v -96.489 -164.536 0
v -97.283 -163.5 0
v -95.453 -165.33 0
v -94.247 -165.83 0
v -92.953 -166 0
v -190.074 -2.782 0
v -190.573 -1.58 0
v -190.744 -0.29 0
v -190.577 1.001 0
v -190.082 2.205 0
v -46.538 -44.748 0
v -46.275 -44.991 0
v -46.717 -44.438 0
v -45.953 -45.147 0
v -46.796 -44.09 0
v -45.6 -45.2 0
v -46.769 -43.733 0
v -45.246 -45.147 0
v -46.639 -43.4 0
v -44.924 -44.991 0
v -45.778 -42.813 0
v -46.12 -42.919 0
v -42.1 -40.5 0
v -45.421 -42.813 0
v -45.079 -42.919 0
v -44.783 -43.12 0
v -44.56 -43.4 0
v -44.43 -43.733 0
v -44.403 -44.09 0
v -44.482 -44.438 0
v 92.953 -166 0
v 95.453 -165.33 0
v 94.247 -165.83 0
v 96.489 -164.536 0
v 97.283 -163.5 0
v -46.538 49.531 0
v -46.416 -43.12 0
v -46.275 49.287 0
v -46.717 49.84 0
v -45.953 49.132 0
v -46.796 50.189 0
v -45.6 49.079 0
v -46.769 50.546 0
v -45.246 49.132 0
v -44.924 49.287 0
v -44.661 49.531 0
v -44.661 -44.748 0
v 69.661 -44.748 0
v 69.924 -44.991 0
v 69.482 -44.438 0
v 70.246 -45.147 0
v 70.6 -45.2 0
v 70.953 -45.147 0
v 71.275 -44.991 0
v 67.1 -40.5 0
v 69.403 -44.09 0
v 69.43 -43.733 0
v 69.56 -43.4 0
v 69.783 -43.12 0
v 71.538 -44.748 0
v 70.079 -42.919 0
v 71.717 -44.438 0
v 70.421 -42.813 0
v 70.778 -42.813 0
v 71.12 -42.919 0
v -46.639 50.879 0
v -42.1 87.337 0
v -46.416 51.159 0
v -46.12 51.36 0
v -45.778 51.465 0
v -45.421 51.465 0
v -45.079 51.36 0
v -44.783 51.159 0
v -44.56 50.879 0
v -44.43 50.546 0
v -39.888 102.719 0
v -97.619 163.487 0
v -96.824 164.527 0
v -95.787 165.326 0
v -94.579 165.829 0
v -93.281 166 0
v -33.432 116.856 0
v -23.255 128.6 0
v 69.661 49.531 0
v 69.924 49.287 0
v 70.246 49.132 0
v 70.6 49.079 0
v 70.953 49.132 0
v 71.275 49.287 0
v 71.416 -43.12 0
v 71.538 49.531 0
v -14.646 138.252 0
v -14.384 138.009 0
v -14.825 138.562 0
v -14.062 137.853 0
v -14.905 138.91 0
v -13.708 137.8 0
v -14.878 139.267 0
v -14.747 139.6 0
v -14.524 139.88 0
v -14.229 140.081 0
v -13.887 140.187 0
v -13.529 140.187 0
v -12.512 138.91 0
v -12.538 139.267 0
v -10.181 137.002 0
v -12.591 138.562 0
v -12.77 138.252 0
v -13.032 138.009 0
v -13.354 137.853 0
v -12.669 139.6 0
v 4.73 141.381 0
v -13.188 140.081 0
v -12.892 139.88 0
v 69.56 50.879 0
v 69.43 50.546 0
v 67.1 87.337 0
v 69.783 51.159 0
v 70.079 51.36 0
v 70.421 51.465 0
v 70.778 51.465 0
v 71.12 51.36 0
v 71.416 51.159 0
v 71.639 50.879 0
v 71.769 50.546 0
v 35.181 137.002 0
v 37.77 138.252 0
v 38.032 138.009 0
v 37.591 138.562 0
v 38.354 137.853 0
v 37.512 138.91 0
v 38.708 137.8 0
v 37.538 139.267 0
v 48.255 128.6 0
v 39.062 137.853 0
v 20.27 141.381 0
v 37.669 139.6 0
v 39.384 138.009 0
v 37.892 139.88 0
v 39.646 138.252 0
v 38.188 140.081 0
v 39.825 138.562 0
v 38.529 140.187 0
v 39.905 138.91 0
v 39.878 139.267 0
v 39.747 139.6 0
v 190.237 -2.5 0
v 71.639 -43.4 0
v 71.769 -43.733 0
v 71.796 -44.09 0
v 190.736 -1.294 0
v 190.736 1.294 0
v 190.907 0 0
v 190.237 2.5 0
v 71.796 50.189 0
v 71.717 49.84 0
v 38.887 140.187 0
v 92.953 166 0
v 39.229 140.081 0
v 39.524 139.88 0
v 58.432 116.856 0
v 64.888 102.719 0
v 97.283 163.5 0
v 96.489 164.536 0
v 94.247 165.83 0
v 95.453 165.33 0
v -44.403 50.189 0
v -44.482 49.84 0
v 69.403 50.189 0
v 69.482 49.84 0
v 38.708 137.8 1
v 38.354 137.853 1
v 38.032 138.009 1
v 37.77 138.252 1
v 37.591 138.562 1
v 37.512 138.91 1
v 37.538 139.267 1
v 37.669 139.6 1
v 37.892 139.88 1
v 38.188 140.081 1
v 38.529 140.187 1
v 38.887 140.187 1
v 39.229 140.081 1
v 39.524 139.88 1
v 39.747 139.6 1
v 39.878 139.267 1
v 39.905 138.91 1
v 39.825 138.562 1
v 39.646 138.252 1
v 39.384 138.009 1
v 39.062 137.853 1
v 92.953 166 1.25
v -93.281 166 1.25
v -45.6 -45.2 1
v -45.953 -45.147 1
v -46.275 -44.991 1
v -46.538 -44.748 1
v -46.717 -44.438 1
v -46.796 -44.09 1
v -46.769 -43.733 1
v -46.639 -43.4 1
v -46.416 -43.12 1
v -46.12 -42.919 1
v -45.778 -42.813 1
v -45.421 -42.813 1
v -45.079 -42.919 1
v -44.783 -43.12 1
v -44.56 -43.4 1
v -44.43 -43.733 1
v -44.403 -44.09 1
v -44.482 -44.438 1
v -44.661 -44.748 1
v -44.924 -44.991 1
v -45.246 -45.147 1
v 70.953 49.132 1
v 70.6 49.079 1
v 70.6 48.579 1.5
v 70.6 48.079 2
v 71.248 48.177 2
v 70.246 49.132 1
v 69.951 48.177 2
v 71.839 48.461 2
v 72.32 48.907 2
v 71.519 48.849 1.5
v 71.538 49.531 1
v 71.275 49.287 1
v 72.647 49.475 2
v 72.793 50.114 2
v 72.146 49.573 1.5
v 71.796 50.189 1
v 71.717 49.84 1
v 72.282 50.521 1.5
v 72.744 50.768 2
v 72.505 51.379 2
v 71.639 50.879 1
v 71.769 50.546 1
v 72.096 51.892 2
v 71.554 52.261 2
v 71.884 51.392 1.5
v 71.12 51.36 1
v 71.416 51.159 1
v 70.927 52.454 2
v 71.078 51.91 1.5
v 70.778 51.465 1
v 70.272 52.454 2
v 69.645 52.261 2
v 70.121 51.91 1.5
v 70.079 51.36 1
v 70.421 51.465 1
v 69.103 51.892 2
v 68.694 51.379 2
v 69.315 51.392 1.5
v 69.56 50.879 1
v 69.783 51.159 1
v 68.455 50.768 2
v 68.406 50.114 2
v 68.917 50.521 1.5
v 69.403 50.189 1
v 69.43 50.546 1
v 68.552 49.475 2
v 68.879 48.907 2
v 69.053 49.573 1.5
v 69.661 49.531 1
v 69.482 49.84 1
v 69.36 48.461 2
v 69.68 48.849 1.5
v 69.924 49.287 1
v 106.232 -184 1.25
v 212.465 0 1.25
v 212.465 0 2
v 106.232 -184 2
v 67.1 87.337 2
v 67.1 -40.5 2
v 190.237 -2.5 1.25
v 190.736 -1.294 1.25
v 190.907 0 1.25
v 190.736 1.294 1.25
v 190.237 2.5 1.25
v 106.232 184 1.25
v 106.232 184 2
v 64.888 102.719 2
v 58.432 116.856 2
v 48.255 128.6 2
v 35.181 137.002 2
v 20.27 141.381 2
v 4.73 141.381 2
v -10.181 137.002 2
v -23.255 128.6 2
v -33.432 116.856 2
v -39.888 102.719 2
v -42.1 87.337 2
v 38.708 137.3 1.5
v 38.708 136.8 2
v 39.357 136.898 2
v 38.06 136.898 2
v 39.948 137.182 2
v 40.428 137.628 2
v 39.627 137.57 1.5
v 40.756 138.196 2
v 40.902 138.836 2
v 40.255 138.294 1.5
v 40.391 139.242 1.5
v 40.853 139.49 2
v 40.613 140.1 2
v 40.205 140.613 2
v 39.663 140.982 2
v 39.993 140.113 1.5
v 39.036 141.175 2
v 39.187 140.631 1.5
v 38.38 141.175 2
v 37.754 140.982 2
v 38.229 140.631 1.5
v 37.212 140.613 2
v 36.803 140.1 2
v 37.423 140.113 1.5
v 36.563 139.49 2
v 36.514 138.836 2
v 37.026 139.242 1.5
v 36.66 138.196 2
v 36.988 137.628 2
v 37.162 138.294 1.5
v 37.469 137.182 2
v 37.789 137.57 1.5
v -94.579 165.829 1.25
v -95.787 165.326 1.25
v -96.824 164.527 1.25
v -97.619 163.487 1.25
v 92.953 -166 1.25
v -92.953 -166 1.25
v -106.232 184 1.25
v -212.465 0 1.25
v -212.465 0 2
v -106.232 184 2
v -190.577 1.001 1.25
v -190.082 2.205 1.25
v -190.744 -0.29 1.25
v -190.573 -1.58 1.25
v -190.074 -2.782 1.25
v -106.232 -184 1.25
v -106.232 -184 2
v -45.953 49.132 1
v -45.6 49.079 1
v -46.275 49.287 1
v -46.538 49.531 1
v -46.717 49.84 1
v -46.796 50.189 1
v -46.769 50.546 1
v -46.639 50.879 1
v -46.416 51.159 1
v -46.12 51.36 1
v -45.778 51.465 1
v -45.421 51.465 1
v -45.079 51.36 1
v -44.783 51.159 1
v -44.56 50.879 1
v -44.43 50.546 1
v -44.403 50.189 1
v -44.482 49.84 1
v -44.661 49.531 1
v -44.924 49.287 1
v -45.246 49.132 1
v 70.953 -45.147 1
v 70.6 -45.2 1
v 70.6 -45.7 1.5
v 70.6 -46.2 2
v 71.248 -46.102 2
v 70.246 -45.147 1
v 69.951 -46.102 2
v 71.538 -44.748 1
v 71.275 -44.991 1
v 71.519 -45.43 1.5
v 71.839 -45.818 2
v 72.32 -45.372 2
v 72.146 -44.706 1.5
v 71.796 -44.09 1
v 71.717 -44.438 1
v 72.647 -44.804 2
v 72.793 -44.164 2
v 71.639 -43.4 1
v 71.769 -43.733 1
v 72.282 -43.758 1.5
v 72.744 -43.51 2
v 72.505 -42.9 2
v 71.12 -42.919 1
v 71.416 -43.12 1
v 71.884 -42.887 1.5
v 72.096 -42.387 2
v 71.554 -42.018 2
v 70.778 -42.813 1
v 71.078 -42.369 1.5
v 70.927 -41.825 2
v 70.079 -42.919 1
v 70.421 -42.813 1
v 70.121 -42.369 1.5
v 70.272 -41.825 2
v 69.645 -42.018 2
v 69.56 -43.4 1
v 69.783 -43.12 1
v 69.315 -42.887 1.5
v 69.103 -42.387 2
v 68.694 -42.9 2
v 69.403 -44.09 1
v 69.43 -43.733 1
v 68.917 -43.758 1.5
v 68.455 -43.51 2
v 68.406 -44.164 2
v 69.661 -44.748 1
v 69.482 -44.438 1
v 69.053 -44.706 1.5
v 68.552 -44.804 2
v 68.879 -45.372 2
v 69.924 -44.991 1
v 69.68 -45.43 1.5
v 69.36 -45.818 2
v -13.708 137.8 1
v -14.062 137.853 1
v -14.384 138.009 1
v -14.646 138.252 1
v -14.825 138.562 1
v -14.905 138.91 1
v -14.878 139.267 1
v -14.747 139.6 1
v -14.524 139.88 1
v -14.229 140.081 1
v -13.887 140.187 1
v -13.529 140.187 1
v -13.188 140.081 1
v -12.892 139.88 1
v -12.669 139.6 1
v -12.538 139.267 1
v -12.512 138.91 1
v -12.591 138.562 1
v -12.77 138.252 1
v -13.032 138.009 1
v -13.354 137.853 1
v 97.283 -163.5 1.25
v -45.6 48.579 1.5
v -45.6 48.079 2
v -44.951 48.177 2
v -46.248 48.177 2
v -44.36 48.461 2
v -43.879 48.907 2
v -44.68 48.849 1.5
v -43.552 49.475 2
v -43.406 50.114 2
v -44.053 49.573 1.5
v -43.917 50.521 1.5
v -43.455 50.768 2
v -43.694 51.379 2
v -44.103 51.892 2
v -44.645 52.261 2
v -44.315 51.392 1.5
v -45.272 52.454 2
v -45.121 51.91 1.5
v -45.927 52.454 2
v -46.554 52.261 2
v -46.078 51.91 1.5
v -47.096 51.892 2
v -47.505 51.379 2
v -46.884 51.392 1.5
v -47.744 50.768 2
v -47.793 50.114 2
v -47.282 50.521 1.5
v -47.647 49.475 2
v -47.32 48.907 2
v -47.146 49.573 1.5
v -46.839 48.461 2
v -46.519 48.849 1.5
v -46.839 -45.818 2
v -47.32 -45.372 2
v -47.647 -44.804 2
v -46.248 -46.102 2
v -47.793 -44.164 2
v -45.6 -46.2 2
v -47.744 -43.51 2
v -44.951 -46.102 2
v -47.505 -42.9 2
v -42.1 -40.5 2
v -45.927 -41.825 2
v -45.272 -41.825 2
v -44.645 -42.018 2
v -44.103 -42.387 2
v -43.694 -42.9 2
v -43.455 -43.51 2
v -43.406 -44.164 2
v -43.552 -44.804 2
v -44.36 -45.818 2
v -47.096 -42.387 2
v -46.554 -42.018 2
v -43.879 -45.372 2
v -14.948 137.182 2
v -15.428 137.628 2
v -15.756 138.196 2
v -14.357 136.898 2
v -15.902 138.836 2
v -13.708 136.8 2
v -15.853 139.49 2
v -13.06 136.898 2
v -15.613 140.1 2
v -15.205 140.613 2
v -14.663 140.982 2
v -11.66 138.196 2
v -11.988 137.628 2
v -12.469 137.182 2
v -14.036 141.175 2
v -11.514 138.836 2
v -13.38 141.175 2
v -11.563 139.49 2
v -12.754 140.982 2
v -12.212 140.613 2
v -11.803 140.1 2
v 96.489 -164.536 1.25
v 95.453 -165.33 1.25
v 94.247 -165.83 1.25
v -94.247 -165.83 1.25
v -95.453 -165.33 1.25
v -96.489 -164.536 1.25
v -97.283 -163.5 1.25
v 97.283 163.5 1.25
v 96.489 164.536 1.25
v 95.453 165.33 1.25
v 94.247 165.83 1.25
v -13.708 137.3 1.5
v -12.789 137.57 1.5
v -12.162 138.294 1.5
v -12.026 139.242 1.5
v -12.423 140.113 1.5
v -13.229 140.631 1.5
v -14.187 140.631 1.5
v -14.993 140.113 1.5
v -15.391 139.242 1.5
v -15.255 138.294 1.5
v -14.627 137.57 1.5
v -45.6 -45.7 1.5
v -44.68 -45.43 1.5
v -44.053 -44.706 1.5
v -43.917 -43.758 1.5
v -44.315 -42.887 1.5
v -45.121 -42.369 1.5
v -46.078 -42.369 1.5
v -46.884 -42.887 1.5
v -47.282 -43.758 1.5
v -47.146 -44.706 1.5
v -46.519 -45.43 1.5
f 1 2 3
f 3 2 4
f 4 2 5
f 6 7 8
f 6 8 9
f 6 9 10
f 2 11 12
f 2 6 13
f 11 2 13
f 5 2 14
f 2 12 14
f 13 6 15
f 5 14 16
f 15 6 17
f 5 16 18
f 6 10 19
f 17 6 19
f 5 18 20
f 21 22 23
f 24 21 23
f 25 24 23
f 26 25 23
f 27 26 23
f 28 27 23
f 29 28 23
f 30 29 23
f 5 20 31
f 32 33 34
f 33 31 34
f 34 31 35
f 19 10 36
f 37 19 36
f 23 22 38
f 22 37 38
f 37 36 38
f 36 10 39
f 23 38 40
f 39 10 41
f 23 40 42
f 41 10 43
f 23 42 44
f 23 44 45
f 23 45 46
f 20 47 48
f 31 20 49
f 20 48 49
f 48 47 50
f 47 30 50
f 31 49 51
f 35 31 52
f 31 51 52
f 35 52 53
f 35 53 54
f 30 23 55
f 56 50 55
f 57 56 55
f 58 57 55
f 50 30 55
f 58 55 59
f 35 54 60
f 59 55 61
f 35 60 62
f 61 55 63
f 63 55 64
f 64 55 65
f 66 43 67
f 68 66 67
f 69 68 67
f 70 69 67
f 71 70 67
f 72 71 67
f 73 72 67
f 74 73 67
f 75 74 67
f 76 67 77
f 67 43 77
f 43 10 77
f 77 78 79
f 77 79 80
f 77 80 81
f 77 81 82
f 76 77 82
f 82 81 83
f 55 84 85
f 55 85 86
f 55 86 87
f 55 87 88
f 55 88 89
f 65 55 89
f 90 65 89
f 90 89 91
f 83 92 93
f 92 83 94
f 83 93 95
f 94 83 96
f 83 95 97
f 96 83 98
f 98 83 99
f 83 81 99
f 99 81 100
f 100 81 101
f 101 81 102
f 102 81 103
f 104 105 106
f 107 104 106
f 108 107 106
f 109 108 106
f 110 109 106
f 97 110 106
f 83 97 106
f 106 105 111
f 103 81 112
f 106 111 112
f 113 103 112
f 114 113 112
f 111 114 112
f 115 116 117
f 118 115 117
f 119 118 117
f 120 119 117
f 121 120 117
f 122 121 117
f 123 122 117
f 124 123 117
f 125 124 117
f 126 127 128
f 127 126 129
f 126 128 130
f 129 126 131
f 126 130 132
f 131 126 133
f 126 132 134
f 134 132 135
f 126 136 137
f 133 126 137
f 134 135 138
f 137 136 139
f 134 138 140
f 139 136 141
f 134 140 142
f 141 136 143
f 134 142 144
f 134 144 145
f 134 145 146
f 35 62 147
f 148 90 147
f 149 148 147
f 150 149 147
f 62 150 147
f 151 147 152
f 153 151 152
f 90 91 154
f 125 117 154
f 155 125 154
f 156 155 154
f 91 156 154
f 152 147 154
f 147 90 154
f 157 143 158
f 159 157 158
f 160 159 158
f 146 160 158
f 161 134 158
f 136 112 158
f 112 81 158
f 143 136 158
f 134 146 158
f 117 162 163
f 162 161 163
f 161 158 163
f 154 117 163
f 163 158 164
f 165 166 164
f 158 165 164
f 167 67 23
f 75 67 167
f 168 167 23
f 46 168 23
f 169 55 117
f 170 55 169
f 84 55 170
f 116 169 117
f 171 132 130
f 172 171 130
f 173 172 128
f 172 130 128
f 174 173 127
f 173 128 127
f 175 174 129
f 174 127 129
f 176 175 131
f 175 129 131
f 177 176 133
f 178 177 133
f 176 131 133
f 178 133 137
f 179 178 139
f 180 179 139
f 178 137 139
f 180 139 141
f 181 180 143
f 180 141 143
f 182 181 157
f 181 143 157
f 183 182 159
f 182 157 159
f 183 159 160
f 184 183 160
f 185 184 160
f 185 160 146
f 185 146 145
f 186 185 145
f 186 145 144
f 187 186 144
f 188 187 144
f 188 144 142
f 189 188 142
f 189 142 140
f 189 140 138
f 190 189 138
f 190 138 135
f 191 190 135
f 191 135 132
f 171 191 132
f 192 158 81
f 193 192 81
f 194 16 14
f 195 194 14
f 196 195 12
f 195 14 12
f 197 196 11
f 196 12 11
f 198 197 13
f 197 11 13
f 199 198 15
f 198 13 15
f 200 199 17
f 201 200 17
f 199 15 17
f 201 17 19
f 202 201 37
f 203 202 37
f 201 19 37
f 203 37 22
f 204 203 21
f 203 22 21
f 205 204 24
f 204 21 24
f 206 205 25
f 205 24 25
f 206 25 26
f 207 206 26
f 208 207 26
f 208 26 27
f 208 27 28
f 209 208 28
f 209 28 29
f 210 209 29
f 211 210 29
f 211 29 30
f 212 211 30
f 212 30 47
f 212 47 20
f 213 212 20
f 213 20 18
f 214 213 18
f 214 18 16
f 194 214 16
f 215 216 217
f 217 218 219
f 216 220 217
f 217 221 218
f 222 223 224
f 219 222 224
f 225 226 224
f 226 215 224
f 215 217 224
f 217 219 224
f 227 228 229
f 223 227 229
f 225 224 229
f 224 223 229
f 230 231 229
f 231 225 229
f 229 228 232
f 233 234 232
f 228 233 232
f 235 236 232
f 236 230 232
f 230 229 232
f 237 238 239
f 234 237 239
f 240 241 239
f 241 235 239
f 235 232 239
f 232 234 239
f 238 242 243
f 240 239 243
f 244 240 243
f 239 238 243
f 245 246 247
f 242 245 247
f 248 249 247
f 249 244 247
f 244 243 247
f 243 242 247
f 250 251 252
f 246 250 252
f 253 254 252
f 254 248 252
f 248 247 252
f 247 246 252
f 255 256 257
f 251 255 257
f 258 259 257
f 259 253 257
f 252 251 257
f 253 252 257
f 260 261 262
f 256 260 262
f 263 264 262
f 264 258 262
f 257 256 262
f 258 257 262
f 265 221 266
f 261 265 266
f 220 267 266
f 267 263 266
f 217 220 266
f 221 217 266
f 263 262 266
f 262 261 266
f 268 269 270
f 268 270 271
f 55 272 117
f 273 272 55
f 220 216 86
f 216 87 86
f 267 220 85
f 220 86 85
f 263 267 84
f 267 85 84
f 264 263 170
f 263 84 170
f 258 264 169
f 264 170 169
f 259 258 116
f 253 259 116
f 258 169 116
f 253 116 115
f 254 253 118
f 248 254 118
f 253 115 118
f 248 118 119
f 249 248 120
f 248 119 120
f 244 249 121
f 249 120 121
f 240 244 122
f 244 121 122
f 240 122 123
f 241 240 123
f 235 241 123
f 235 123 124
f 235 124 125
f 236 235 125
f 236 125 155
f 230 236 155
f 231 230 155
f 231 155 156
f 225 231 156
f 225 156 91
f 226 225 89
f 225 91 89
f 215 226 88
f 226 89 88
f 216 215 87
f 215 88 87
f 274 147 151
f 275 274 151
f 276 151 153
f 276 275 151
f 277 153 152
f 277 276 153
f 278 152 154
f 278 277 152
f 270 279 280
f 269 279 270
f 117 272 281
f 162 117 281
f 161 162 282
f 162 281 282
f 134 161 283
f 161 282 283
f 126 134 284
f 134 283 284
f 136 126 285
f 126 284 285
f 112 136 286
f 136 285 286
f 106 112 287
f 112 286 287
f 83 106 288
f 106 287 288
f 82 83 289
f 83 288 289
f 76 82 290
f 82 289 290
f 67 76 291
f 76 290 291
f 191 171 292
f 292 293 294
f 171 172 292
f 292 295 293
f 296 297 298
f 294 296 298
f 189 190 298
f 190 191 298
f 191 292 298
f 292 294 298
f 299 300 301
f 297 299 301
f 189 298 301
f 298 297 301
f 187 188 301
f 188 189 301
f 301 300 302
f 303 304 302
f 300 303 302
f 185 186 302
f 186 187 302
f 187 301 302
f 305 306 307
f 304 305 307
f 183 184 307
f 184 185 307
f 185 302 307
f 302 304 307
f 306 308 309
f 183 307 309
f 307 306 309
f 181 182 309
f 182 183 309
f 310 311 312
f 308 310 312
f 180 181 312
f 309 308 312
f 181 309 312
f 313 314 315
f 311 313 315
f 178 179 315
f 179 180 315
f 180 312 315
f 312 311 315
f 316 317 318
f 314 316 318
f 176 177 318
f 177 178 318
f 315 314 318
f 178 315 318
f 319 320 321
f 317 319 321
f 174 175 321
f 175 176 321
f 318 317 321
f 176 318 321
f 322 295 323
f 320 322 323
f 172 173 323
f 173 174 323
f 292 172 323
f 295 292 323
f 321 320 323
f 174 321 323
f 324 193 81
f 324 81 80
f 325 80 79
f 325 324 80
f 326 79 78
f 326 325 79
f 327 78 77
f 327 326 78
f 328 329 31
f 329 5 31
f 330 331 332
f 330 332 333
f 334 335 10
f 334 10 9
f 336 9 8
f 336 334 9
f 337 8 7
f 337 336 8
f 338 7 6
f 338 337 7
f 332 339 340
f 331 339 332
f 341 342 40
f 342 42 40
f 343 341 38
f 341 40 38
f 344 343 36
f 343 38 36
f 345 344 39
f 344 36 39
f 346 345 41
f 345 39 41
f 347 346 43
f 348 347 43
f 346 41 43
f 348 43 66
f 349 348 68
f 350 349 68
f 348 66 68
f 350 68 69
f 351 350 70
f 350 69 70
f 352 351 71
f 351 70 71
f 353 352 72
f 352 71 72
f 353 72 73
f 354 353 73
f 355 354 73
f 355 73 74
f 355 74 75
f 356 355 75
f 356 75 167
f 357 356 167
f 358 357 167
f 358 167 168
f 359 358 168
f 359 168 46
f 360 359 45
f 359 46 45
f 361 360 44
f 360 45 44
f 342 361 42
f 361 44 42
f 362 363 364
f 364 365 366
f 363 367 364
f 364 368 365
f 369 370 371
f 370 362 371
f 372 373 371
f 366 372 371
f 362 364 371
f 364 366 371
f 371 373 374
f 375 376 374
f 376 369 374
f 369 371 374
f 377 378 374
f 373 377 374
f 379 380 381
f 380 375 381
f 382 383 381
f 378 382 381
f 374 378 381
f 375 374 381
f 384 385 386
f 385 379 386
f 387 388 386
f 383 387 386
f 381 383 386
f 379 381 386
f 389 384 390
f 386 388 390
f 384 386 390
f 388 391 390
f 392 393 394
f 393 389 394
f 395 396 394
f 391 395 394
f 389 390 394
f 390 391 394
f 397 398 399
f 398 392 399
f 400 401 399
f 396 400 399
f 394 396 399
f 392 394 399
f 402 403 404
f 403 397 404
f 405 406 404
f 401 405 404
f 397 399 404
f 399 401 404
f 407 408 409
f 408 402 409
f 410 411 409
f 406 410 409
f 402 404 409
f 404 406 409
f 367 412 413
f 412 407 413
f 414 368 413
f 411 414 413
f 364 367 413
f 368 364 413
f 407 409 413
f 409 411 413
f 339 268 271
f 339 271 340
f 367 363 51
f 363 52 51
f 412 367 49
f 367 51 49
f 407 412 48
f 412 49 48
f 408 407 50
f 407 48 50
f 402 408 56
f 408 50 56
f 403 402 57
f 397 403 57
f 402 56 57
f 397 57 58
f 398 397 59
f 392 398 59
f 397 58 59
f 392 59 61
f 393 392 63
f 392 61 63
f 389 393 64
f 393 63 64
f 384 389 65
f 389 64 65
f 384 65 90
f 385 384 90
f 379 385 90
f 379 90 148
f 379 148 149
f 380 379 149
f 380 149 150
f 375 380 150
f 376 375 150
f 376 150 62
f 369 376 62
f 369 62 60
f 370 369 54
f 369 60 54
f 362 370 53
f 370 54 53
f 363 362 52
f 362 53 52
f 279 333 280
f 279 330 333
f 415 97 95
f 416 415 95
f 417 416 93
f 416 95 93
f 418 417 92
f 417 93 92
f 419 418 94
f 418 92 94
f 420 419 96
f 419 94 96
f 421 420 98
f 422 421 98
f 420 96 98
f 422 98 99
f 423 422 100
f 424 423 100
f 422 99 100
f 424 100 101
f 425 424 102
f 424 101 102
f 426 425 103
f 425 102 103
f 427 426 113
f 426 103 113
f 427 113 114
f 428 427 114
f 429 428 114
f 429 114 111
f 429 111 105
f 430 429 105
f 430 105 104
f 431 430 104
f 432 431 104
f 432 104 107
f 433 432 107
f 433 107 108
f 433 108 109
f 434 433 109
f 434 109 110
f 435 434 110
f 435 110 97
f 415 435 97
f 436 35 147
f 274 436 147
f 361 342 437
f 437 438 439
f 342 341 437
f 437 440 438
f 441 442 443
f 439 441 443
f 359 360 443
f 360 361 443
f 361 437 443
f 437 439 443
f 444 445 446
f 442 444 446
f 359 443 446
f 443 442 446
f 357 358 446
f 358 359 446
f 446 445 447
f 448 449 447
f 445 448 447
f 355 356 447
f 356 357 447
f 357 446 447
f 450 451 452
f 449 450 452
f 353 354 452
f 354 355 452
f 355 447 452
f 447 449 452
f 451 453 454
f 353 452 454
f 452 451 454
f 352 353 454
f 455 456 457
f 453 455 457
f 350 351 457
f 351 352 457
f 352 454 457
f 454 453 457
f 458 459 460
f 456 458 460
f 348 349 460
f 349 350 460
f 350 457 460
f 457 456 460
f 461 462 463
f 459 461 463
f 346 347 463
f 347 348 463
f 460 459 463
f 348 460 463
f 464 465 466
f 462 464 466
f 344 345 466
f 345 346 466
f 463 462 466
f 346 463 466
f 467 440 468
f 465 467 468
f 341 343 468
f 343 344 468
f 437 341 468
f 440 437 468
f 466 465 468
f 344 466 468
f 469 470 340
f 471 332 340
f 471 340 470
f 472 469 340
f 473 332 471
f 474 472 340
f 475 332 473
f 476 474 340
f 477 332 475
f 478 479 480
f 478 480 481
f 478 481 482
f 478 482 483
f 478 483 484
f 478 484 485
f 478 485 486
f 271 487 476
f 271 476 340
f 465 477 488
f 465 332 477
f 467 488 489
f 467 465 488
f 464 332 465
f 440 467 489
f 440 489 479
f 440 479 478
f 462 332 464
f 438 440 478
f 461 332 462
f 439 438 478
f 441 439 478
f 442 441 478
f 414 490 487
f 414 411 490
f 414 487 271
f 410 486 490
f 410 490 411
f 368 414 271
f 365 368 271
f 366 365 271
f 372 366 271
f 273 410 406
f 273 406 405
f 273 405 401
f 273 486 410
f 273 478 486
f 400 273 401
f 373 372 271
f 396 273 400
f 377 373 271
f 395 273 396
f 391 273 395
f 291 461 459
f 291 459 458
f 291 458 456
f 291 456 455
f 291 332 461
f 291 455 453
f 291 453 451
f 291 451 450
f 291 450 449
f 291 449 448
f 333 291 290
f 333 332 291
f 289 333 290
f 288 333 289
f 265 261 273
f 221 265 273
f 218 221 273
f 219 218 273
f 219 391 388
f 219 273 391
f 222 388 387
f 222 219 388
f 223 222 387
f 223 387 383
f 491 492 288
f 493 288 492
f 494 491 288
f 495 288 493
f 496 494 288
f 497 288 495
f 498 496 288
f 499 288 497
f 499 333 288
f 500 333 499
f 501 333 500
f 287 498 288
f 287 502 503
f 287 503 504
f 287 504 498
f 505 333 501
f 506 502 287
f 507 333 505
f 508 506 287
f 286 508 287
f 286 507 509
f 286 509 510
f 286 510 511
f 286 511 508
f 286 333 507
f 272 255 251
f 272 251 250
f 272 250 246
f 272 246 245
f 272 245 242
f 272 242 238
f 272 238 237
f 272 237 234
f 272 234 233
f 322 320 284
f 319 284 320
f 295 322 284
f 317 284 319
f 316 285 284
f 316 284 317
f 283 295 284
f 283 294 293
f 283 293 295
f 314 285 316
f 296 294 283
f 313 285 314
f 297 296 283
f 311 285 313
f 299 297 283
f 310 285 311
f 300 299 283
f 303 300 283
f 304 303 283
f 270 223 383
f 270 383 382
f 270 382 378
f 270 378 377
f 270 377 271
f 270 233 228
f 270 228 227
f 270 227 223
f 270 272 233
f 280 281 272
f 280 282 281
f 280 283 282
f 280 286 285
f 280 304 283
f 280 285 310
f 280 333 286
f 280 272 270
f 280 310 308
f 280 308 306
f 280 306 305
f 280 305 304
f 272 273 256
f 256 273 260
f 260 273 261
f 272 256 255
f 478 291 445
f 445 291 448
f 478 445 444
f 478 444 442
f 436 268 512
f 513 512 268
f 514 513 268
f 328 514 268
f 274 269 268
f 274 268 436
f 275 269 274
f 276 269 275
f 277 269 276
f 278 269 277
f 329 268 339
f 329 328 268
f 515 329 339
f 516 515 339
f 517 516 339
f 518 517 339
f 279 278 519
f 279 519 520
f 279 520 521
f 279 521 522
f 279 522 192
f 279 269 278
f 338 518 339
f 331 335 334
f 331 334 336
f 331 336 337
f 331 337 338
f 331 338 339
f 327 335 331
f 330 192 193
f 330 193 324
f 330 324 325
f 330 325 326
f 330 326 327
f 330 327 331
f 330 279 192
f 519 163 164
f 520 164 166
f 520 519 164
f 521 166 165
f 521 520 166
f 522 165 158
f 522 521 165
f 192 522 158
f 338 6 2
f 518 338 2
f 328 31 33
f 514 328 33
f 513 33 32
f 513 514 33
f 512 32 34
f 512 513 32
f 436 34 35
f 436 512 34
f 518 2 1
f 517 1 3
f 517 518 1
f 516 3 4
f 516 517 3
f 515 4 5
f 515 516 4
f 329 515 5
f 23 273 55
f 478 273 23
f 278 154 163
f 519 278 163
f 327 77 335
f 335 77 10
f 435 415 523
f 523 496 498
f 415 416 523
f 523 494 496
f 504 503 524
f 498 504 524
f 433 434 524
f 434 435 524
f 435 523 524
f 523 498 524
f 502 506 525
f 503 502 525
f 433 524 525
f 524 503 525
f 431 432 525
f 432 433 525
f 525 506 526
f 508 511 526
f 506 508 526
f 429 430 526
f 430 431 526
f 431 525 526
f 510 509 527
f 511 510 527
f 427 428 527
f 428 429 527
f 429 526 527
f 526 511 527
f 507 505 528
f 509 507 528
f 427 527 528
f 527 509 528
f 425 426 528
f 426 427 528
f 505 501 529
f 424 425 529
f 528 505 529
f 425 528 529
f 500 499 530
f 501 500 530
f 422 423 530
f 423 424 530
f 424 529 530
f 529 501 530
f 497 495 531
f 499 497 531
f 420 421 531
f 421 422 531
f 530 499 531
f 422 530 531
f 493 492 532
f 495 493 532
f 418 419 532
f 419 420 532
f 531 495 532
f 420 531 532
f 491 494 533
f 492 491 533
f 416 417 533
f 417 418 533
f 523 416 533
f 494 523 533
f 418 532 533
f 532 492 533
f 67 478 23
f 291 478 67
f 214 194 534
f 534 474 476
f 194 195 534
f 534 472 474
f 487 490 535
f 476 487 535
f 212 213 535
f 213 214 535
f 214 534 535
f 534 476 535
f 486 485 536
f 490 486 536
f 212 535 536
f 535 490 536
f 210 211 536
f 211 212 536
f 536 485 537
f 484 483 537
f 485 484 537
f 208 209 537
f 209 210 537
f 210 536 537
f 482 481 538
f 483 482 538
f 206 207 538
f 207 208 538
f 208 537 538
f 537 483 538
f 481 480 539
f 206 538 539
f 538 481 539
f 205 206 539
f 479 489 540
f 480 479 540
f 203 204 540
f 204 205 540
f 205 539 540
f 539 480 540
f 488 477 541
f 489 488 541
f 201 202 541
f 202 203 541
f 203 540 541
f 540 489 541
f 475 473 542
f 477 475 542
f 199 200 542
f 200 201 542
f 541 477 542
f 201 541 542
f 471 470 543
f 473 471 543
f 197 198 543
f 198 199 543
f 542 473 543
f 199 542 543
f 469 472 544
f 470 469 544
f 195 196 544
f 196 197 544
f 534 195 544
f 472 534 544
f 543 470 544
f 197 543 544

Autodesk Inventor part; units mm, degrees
ref_plane "YZ Plane" through (0, 0, 0) normal (1, 0, 0) x (0, 1, 0)
ref_plane "XZ Plane" through (0, 0, 0) normal (0, 1, 0) x (-1, 0, 0)
ref_plane "XY Plane" through (0, 0, 0) normal (0, 0, 1) x (1, 0, 0)
sketch "Sketch1" plane through (0, 0, 0) normal (0, 0, 1) x (1, 0, 0)
  line L0 (212.4649, 0) -> (106.2324, -184)
  line L1 (106.2324, -184) -> (-106.2324, -184)
  line L2 (-106.2324, -184) -> (-212.4649, 0)
  line L3 (-212.4649, 0) -> (-106.2324, 184)
  line L4 (-106.2324, 184) -> (106.2324, 184)
  line L5 (106.2324, 184) -> (212.4649, 0)
  point P0 (0, 0)
  point P1 (0, 0)
  dimension "d0" = 368
extrude "Extrusion1" add sketch "Sketch1" along normal blind 2
sketch "Sketch7" plane through (0, 0, 0) normal (0, 0, -1) x (-1, 0, 0)
  line L0 (-66.5995, 87.3368) -> (-66.5995, -40)
  line L1 (41.5995, 87.3368) -> (41.5995, -40)
  line L2 (-66.5995, -40) -> (41.5995, -40)
  arc A0 (41.5995, 87.3368) -> (-66.5995, 87.3368) centre (-12.5, 87.3368) ccw
  point P0 (0, 0)
extrude "Extrusion5" cut sketch "Sketch7" against normal blind 10
sketch "Sketch8" plane through (0, 0, 0) normal (0, 0, -1) x (-1, 0, 0)
  line L0 (-191.6803, 0) -> (-95.8401, 166)
  line L1 (-95.8401, 166) -> (96.1778, 166)
  line L2 (96.1778, 166) -> (191.5124, -0.2908)
  line L3 (191.5124, -0.2908) -> (95.8401, -166)
  line L4 (95.8401, -166) -> (-95.8401, -166)
  line L5 (-95.8401, -166) -> (-191.6803, 0)
  line L6 (-106.2324, -184) -> (-212.4649, 0) projected
  line L7 (-106.2324, -184) -> (-212.4649, 0)
  line L8 (106.2324, -184) -> (-106.2324, -184) projected
  line L9 (-106.2324, -184) -> (106.2324, -184)
  line L10 (212.4649, 0) -> (106.2324, -184) projected
  line L11 (106.2324, -184) -> (212.2788, -0.3224)
  line L12 (106.2324, 184) -> (212.4649, 0) projected
  line L13 (212.2788, -0.3224) -> (106.6066, 184)
  line L14 (-106.2324, 184) -> (106.2324, 184) projected
  line L15 (-106.2324, 184) -> (297.9127, 184)
  line L16 (-212.4649, 0) -> (-106.2324, 184) projected
  line L17 (-212.4649, 0) -> (-106.2324, 184)
  line L18 (-106.2324, 184) -> (106.2324, 184) projected
  point P0 (0, 0)
  dimension "d25" = 18
  dimension "d26" = 18
  dimension "d27" = 18
  dimension "d28" = 18
  dimension "d29" = 18
  dimension "d30" = 18
extrude "Extrusion6" cut sketch "Sketch8" against normal blind 1.25 contours L6 L16 L14 L12 L13 L10 L8 | L13 L12 L10
fillet "Fillet1" radius 5 6 edges at (-96.1778, 166, 0.625) (-191.5124, -0.2908, 0.625) (-95.8401, -166, 0.625) (95.8401, -166, 0.625) (191.6803, 0, 0.625) (95.8401, 166, 0.625)
sketch "Sketch10" plane through (0, 0, 0) normal (0, 0, -1) x (-1, 0, 0)
  circle A0 centre (13.7082, 139) radius 0.7835 projected
  circle A1 centre (45.5995, 50.2789) radius 0.7835 projected
  circle A2 centre (45.5995, -44) radius 0.7835 projected
  circle A3 centre (-70.5995, -44) radius 0.7835 projected
  circle A4 centre (-70.5995, 50.2789) radius 0.7835 projected
  circle A5 centre (-38.7082, 139) radius 0.7835 projected
  point P0 (0, 0)
extrude "Extrusion8" cut sketch "Sketch10" against normal blind 10
sketch "Sketch11" plane through (0, 0, 0) normal (0, 0, -1) x (-1, 0, 0)
  point P0 (0, 0)
sketch "Sketch12" plane through (0, 0, 2) normal (0, 0, 1) x (1, 0, 0)
  arc A0 (66.5995, 87.3368) -> (-41.5995, 87.3368) centre (12.5, 87.3368) ccw projected
  line L0 (-41.5995, -40) -> (-41.5995, 87.3368) projected
  line L1 (66.5995, 87.3368) -> (66.5995, -40) projected
  line L2 (66.5995, -40) -> (-41.5995, -40) projected
  arc A1 (67.0995, 87.3368) -> (-42.0995, 87.3368) centre (12.5, 87.3368) ccw
  line L3 (67.0995, 87.3368) -> (67.0995, -40.5)
  line L4 (67.0995, -40.5) -> (-42.0995, -40.5)
  line L5 (-42.0995, -40.5) -> (-42.0995, 87.3368)
  point P0 (0, 0)
  dimension "d35" = 0.5
extrude "Extrusion9" cut sketch "Sketch12" against normal blind 10 contours L1 L2 L0 A0 | L3 L4 L5 A1
sketch "Sketch13" plane through (0, 0, 2) normal (0, 0, 1) x (1, 0, 0)
  circle A0 centre (-13.7082, 139) radius 0.7835 projected
  circle A1 centre (38.7082, 139) radius 0.7835 projected
  circle A2 centre (70.5995, 50.2789) radius 0.7835 projected
  circle A3 centre (-45.5995, 50.2789) radius 0.7835 projected
  circle A4 centre (70.5995, -44) radius 0.7835 projected
  circle A5 centre (-45.5995, -44) radius 0.7835 projected
  point P0 (0, 0)
hole "Hole1" at (-45.5995, -44, 2) at (70.5995, -44, 2) at (70.5995, 50.2789, 2) at (-13.7082, 139, 2) at (38.7082, 139, 2) at (-45.5995, 50.2789, 2) direction (0, 0, -1) diameter 2.4 depth 3 tip angle 118 countersink diameter 4.4 countersink angle 90 clearance for "Countersunk Flat Head Screw ISO 2009/7046" size "M2" standard "ISO"
equation "\"d26\" = d25"
equation "\"d27\" = d25"
equation "\"d28\" = d25"
equation "\"d29\" = d25"
equation "\"d30\" = d25"
properties part number "AEON.AluminiumFrame"
